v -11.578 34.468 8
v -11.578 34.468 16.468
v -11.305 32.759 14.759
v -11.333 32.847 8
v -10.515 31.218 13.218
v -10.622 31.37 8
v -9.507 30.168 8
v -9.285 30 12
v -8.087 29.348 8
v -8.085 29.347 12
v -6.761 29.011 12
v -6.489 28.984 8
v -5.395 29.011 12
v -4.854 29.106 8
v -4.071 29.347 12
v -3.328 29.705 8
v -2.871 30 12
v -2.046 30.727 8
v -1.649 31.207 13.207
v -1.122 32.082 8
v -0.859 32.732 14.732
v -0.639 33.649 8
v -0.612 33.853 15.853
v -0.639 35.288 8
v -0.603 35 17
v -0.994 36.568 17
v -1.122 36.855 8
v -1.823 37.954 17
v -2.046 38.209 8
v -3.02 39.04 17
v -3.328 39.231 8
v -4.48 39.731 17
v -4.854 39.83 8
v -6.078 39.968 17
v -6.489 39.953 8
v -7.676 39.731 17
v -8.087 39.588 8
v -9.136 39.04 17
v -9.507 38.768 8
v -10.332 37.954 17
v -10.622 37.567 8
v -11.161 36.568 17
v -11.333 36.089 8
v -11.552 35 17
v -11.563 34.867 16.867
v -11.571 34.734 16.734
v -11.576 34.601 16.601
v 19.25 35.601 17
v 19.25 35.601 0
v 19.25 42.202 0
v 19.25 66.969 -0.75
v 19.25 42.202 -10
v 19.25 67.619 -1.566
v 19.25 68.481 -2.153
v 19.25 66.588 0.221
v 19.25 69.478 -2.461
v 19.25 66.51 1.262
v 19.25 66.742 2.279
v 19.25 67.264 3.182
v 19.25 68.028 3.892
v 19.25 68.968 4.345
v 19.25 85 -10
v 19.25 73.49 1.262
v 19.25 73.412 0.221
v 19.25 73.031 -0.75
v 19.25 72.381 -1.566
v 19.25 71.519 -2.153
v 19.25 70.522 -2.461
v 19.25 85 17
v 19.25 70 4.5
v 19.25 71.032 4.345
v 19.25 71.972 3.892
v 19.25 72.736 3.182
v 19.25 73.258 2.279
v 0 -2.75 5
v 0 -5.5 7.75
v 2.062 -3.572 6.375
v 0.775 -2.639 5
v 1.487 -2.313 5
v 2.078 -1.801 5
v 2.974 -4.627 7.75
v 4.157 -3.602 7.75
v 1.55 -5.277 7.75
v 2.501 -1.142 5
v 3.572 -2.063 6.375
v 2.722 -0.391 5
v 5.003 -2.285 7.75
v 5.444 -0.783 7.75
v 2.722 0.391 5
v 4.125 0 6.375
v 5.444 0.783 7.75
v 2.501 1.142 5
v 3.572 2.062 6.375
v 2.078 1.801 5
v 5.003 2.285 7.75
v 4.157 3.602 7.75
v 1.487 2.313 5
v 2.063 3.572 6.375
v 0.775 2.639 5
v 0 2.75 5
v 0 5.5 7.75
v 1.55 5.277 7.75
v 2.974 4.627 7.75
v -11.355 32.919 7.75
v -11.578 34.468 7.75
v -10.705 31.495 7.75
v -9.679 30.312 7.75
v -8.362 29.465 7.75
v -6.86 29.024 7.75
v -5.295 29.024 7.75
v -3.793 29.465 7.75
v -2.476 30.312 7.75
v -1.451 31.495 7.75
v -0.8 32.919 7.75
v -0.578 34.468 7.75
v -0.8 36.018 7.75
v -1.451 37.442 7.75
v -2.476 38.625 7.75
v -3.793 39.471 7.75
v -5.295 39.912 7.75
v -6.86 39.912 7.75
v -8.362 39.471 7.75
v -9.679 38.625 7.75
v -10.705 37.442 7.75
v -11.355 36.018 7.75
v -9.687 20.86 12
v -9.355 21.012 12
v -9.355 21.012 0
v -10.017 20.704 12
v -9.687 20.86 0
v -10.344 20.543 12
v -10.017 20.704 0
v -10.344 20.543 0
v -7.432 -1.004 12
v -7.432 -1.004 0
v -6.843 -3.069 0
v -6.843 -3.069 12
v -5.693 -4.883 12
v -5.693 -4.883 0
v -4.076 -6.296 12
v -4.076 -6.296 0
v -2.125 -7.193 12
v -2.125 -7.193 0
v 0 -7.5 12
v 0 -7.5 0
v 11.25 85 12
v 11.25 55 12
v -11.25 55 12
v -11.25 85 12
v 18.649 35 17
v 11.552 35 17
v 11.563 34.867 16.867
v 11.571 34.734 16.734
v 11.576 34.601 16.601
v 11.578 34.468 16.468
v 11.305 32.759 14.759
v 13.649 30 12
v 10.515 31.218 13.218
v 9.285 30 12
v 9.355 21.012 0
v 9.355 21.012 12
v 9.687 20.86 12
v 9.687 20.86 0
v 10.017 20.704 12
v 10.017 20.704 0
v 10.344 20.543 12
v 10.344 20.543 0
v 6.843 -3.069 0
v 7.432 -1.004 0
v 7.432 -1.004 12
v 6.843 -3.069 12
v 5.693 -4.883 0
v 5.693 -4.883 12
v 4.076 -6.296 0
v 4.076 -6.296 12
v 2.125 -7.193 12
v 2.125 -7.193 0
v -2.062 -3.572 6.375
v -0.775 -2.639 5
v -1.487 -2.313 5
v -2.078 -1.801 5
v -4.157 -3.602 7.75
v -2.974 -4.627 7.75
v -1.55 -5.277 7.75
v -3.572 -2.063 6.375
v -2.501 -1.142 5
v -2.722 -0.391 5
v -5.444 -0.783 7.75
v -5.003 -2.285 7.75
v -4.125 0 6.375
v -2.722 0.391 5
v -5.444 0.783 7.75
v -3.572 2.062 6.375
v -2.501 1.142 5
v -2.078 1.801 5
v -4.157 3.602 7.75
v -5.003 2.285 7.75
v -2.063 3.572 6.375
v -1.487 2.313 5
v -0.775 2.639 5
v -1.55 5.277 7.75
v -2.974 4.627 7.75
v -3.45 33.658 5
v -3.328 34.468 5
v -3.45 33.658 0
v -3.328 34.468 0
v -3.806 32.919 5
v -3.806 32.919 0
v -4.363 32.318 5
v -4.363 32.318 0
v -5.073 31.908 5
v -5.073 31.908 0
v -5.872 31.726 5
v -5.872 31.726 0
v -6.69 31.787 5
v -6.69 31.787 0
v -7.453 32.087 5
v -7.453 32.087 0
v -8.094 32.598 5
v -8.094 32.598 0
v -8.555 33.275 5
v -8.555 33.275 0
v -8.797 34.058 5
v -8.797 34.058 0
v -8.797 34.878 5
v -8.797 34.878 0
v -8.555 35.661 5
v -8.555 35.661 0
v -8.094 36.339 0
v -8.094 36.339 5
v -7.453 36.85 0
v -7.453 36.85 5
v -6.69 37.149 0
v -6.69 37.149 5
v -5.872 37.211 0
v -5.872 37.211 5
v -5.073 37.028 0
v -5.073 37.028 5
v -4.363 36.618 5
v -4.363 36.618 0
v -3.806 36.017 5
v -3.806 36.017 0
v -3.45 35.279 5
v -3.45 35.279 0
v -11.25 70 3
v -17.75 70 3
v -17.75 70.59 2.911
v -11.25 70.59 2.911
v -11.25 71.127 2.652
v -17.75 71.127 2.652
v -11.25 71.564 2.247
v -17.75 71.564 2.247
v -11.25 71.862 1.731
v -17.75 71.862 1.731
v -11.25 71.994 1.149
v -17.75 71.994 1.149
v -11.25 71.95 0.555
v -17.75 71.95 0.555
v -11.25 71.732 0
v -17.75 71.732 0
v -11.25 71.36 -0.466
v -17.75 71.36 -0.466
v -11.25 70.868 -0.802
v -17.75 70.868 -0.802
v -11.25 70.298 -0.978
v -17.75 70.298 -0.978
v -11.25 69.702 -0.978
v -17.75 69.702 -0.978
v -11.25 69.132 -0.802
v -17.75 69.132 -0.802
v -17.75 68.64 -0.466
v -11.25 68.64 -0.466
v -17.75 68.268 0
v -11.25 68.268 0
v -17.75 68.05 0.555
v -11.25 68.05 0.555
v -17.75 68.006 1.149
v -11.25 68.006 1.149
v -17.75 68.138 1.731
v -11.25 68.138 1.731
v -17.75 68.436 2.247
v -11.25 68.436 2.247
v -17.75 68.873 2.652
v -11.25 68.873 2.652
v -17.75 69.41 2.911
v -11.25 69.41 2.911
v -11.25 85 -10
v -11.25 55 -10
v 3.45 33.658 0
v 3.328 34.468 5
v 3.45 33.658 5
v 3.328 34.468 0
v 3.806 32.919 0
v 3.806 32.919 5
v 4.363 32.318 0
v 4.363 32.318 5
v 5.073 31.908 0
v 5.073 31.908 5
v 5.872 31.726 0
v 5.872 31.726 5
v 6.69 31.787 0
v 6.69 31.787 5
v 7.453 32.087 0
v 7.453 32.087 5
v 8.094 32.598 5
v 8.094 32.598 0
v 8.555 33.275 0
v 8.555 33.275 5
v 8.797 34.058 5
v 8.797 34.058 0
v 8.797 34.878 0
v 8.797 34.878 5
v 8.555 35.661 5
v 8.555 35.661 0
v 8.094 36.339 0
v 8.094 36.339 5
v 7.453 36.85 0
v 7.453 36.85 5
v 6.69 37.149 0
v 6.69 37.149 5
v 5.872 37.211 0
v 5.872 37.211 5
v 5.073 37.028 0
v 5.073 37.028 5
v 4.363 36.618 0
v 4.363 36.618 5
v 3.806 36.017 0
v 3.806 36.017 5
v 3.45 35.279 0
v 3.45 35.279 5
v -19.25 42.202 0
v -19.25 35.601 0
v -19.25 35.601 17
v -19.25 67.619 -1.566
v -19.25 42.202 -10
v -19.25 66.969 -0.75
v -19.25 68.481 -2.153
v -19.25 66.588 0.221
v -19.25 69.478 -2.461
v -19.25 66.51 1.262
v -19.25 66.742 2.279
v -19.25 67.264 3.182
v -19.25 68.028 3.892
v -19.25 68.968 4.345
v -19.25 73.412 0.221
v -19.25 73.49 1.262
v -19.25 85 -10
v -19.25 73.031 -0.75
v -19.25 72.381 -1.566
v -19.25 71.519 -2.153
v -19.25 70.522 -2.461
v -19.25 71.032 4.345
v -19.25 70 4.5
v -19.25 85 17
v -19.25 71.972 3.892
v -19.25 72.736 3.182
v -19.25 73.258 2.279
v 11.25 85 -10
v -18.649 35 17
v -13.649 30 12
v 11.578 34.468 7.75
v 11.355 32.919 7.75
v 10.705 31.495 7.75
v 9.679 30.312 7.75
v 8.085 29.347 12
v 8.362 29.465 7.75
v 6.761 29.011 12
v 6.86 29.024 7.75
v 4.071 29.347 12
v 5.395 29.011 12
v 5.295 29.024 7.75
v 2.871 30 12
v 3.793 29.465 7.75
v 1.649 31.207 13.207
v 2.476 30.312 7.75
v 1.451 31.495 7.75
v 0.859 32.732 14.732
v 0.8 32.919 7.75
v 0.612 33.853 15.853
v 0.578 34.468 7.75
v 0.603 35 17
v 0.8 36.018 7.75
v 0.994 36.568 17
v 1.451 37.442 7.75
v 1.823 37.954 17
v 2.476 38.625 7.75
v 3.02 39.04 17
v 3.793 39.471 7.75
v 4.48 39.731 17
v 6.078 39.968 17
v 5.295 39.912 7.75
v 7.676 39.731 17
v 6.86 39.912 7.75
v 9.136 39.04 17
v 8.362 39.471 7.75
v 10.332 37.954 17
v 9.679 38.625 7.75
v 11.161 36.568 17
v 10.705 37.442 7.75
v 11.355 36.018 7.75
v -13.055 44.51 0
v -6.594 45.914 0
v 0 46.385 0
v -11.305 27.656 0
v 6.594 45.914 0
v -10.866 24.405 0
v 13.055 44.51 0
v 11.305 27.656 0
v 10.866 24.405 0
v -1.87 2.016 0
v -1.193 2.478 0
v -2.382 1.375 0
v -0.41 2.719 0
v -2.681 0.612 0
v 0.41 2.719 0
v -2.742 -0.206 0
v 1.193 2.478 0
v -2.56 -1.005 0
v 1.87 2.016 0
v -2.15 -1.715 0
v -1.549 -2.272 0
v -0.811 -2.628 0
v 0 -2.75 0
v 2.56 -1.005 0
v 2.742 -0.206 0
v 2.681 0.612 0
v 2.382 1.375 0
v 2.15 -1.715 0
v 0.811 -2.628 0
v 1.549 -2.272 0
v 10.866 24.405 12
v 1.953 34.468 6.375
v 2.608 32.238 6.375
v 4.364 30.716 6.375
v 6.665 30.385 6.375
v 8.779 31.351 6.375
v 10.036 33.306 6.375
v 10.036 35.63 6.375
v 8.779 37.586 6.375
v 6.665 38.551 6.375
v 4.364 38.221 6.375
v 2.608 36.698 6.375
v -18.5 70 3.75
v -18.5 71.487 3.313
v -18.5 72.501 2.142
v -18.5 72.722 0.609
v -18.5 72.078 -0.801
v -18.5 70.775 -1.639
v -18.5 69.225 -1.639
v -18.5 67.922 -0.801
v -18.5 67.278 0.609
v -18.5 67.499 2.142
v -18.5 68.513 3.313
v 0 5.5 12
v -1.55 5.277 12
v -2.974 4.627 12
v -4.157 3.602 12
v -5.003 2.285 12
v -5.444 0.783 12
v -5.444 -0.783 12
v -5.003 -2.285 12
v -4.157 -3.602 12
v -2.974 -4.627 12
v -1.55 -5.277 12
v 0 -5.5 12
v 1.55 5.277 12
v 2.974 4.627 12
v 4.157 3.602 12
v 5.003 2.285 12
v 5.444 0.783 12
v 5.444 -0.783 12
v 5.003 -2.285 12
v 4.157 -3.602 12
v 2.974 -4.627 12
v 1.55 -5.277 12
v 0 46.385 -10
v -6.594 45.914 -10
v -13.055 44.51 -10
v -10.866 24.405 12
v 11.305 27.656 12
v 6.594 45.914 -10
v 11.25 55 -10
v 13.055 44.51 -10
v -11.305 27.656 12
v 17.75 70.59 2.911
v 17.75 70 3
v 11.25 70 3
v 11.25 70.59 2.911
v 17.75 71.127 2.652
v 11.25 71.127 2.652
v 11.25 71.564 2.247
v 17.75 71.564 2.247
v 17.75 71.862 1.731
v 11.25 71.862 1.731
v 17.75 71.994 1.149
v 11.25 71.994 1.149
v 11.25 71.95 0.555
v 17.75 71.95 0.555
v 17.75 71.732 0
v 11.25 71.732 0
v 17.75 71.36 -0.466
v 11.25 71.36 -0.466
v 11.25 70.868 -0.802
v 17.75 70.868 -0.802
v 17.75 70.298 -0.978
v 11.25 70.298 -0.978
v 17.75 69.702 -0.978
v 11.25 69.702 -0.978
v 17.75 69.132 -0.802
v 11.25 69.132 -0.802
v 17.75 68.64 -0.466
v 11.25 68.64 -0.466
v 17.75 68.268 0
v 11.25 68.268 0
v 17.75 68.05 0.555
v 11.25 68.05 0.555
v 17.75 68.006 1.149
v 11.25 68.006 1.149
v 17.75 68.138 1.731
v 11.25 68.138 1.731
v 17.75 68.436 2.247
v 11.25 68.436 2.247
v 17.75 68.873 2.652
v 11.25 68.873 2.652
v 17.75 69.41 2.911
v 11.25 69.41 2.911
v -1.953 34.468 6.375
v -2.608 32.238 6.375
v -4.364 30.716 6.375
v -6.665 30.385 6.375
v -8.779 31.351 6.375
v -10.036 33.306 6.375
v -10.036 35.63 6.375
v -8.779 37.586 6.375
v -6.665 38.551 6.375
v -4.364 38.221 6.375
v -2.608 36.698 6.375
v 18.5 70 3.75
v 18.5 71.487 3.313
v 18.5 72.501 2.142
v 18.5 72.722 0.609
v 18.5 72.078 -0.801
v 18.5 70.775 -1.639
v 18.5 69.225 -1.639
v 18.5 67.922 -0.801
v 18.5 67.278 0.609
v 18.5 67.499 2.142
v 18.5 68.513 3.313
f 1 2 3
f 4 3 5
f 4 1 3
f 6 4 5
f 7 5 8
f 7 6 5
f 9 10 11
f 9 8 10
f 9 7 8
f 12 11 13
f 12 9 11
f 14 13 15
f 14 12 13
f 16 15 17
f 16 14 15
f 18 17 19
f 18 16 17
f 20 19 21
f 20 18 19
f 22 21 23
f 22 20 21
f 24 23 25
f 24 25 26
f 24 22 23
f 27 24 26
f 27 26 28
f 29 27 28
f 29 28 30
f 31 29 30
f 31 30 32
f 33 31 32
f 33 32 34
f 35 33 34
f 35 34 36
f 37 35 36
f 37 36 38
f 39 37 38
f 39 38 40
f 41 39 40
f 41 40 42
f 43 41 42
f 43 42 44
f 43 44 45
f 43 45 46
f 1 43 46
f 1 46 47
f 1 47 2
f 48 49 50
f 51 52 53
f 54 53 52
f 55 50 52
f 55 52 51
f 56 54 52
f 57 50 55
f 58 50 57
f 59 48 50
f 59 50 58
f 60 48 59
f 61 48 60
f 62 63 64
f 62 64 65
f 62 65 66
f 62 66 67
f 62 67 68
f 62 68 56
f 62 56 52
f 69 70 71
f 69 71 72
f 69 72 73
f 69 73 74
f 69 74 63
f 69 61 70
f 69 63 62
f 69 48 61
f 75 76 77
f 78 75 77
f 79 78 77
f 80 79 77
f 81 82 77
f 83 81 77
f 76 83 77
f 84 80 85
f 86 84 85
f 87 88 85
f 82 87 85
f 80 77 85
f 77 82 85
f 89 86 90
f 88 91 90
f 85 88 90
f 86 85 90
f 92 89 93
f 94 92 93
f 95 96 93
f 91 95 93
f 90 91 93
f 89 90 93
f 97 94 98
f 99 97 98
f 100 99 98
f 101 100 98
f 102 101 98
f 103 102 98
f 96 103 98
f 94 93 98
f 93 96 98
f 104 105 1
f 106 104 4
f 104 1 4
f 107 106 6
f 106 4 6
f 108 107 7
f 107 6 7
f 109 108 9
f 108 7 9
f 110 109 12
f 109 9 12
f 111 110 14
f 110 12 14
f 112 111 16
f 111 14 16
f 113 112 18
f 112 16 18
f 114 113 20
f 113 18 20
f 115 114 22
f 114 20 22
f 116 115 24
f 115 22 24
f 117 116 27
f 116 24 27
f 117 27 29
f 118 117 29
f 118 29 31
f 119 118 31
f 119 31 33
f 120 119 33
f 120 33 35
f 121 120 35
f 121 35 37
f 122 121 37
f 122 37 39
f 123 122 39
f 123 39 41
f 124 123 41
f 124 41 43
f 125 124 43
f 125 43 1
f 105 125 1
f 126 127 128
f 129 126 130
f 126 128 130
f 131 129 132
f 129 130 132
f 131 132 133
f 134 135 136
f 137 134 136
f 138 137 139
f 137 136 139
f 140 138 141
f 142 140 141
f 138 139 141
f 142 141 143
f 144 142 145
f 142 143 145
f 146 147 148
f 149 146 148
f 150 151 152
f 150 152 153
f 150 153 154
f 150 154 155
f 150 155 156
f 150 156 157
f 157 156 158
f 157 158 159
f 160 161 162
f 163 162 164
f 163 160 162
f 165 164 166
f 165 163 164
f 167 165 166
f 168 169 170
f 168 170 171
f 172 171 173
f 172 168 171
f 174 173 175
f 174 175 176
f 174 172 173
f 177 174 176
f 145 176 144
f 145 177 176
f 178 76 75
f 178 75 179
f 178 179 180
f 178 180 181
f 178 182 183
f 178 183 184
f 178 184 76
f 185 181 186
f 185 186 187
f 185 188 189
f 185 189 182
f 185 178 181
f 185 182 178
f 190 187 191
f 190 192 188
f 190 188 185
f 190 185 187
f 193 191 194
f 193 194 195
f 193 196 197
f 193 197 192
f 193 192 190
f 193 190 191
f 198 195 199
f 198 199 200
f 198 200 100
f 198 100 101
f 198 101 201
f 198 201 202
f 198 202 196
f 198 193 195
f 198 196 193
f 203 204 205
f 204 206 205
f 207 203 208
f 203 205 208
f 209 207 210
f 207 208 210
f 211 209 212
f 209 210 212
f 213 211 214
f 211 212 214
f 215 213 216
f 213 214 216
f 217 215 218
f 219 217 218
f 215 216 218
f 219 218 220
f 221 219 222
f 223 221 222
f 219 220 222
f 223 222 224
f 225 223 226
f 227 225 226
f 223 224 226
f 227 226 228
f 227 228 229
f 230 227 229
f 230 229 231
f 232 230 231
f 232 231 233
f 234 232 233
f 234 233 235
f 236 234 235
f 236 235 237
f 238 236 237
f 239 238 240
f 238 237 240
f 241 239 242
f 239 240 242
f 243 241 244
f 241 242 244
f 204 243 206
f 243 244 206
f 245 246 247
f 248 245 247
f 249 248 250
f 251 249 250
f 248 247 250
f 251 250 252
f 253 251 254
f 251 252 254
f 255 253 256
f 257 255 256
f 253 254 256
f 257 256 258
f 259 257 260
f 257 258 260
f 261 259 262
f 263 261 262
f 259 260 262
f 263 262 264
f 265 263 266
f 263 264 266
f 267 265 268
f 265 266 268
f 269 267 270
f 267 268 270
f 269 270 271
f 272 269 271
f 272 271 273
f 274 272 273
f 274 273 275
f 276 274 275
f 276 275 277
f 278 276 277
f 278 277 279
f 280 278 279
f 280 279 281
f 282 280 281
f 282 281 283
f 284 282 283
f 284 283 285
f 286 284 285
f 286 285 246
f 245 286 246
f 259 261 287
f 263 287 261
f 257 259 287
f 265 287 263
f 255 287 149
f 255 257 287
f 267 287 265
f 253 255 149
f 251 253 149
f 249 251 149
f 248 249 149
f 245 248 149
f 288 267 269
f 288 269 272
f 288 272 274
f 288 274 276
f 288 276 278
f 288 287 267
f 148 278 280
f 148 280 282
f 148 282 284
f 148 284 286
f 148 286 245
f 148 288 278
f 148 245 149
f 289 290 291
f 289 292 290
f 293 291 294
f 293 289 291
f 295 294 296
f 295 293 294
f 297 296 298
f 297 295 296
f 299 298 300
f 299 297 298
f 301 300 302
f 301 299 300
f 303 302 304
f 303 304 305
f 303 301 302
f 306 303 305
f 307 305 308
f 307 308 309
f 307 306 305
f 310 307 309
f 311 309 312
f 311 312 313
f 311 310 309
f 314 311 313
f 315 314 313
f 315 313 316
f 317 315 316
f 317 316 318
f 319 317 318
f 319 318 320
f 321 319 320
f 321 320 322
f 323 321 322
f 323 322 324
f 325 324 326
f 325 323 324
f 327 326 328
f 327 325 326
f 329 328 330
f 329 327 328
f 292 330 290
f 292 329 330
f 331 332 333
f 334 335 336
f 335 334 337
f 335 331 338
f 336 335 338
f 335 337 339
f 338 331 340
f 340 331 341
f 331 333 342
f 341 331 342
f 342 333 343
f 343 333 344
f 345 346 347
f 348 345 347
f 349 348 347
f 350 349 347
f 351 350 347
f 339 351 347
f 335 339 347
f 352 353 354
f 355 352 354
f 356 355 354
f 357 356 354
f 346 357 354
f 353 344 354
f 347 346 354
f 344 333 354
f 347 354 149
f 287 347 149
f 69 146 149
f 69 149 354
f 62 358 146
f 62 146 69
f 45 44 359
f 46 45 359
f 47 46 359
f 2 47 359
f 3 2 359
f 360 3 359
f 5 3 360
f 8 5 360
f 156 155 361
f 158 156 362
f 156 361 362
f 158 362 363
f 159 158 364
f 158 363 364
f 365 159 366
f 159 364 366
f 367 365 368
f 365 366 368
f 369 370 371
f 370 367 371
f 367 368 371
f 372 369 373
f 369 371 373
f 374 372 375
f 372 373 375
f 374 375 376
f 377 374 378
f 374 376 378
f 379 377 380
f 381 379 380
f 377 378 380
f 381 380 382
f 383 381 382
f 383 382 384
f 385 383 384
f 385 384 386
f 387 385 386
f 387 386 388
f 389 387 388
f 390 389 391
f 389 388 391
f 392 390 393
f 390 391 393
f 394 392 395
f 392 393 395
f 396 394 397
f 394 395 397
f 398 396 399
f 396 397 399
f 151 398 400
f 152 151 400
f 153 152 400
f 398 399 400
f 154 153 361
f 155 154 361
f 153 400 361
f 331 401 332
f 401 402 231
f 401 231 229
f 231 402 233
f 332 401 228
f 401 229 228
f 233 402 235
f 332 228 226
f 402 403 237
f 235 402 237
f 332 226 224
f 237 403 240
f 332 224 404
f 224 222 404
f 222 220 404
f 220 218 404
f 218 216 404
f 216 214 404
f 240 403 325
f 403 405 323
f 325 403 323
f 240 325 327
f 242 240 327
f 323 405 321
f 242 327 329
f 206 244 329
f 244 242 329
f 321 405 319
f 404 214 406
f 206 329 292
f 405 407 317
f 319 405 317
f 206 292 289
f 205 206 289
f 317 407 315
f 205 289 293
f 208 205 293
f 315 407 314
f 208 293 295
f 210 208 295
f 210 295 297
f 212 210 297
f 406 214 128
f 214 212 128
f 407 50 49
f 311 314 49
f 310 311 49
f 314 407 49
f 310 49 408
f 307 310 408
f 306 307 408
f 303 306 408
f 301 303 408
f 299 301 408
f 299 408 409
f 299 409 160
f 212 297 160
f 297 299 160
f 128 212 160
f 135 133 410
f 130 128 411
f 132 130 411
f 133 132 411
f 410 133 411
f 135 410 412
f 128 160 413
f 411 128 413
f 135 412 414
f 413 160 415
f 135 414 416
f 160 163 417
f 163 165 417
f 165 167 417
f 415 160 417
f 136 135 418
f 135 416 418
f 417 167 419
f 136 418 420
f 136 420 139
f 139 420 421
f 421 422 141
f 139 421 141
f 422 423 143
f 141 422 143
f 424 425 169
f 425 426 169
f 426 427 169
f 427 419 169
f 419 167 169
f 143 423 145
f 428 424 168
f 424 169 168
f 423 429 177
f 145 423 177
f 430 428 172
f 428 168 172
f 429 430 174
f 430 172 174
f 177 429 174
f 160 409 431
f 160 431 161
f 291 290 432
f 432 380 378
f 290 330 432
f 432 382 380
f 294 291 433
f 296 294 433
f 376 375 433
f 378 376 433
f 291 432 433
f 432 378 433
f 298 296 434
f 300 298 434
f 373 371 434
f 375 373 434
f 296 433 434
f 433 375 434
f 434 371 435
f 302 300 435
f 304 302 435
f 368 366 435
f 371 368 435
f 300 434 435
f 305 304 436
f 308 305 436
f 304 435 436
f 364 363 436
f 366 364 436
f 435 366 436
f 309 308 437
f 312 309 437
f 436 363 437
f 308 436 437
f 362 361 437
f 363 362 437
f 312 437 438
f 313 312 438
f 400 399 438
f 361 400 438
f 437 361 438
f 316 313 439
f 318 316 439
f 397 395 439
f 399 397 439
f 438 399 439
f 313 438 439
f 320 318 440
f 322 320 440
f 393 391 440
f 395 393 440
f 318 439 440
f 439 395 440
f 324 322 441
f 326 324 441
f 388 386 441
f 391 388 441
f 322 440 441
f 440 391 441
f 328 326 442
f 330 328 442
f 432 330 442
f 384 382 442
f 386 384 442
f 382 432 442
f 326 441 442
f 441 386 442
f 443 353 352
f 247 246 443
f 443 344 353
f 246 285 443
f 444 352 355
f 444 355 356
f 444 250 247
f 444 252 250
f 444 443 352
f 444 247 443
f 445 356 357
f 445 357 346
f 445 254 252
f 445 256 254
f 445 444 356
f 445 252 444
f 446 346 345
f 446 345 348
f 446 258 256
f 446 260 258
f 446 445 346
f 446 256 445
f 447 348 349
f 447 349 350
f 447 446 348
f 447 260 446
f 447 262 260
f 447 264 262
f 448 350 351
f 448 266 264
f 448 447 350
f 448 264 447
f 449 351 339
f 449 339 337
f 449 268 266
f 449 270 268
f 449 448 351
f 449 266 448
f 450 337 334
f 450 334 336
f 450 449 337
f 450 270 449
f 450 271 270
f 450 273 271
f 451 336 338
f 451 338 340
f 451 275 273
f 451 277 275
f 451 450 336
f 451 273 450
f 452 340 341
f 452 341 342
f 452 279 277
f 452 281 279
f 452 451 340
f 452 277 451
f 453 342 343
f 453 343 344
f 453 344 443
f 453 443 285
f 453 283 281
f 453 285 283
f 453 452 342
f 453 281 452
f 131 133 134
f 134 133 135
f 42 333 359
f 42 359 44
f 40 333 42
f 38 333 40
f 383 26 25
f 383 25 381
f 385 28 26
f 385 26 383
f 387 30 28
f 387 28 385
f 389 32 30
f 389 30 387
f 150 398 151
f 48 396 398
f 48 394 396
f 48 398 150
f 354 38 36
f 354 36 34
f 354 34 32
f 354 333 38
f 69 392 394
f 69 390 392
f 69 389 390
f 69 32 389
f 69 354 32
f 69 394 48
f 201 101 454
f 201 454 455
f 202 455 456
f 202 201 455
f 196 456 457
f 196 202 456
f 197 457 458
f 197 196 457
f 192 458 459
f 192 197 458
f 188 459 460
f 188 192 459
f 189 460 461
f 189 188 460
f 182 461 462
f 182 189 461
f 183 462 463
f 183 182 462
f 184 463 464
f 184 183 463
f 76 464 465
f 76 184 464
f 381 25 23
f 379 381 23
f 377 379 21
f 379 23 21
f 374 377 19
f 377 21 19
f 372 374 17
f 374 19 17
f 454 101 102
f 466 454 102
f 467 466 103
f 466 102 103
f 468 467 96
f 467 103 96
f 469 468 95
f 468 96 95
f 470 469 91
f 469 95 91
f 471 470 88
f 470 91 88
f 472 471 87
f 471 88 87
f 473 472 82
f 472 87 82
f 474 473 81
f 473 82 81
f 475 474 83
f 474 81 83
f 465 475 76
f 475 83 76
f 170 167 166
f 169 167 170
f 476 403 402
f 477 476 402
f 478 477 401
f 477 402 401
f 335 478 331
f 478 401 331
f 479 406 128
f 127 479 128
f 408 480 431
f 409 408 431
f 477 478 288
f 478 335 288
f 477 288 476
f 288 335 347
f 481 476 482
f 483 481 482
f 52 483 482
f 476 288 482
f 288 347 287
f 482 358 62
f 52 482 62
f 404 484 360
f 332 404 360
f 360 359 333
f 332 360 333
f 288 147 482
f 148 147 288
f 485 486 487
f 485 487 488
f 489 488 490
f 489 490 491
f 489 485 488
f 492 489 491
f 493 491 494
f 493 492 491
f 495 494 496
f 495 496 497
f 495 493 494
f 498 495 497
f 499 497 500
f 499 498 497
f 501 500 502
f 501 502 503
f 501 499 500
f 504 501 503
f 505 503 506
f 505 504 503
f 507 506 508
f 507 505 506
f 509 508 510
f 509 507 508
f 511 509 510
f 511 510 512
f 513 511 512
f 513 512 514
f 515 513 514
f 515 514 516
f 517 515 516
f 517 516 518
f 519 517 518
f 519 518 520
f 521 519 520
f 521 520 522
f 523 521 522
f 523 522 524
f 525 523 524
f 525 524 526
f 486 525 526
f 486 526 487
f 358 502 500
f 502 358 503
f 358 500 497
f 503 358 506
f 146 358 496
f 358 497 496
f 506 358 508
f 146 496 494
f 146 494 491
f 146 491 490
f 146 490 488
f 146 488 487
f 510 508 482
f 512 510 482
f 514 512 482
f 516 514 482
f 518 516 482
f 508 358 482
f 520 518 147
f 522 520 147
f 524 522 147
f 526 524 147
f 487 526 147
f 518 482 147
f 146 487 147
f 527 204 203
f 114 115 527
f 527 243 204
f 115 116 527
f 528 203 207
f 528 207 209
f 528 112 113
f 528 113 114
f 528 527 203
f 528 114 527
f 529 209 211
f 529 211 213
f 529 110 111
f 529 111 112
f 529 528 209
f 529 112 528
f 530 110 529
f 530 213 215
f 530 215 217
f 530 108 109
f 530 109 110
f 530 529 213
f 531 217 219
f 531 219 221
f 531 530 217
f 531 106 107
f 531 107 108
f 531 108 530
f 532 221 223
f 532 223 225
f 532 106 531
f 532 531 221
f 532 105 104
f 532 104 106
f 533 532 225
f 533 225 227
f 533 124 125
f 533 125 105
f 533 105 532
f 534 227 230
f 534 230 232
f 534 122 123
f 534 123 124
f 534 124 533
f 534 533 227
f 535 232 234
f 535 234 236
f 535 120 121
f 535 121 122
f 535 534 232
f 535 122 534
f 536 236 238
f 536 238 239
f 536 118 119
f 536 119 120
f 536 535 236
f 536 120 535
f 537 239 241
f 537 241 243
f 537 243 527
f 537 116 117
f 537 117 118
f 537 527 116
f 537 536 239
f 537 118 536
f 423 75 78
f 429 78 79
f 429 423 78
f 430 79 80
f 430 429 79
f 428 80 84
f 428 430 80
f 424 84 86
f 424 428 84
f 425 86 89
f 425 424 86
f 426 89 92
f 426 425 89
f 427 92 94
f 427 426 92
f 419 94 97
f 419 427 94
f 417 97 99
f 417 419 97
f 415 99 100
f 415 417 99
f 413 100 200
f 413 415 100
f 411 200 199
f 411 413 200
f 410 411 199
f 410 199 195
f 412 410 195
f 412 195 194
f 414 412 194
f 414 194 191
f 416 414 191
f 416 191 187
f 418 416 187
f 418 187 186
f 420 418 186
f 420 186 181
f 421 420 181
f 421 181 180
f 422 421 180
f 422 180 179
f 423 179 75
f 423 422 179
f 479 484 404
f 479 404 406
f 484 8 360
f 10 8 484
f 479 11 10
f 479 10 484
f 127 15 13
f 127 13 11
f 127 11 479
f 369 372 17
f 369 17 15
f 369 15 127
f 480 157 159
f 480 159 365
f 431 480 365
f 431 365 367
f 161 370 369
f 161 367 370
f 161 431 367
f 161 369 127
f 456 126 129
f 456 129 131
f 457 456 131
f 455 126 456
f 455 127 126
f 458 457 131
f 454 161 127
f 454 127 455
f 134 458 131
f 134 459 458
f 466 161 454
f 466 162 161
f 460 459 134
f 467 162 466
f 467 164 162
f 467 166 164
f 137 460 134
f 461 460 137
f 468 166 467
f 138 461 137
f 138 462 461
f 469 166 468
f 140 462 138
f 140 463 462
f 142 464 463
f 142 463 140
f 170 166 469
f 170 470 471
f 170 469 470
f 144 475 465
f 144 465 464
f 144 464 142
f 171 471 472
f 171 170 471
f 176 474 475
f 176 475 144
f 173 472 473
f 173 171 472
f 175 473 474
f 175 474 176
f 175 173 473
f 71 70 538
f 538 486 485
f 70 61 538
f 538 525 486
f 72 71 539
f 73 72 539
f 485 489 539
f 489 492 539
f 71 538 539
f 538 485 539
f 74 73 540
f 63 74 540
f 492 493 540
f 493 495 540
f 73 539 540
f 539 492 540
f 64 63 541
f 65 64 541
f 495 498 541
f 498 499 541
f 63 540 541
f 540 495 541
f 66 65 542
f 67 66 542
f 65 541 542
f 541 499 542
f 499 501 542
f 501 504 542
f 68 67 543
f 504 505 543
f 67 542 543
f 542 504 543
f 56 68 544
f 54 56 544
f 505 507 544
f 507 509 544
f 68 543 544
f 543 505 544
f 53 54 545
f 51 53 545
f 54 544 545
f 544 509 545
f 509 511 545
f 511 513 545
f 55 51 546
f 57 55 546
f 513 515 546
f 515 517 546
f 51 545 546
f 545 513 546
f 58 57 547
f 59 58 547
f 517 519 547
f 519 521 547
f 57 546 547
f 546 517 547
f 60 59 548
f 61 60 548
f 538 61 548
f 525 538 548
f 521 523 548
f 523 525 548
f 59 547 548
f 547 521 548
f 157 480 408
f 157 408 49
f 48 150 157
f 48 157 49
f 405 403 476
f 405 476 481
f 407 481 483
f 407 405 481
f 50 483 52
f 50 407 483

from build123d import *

# Parameters (mm, degrees)
SKETCH1_R                = 2.75
BOSS_EXTRUDE1_DEPTH      = 12
BOSS_EXTRUDE2_DEPTH      = 30
BOSS_EXTRUDE2_DEPTH_BACK = 10
CHAMFER1_SIZE            = 17.501152045
CHAMFER1_SIZE_2          = 15
SKETCH4_R                = 2
CUT_EXTRUDE1_DEPTH       = 30
CHAMFER2_SIZE            = 1.5
CUT_EXTRUDE2_DEPTH       = 30
CUT_EXTRUDE2_DEPTH_BACK  = 4
SKETCH5_R                = 5.5
CHAMFER3_SIZE            = 3
BOSS_EXTRUDE3_DEPTH      = 10


with BuildPart() as part:
    # Sketch1 → Boss-Extrude1 (new body)
    with BuildSketch(Plane.XY):
        with BuildLine():
            Line((0, 55), (-15, 55))
            Line((-15, 55), (-10.865898, 24.40520649))
            Line((-10.865898, 24.40520649), (-9.354942791, 21.011545526))
            ThreePointArc((-9.354942791, 21.011545526), (-9.852249787, 20.783002048), (-10.343977944, 20.542690191))
            Line((-10.343977944, 20.542690191), (-7.432453853, -1.004305596))
            ThreePointArc((-7.432453853, -1.004305596), (-4.935468976, -5.647224627), (0, -7.5))
            Line((0, -7.5), (0, -2.75))
            ThreePointArc((0, -2.75), (-2.75, 0), (0, 2.75))
            Line((0, 2.75), (0, 55))
        make_face()
        with Locations((-6.077686218, 34.468271355)):
            Circle(SKETCH1_R, mode=Mode.SUBTRACT)
    extrude(amount=BOSS_EXTRUDE1_DEPTH)

    # Sketch3 → Boss-Extrude2 (add, two sides: drawn at the far end of the back side and taken through both)
    with BuildSketch(Plane(origin=(0, 55, 0), x_dir=(1, 0, 0), z_dir=(0, 1, 0)).offset(-BOSS_EXTRUDE2_DEPTH_BACK)):
        Polygon((0, -17), (-19.25, -17), (-19.25, 10), (-11.25, 10), (-11.25, -12), (0, -12), align=None)
    extrude(amount=BOSS_EXTRUDE2_DEPTH + BOSS_EXTRUDE2_DEPTH_BACK)

    # Chamfer1
    # the kernel refuses this chamfer: 17.501152045, 15 mm, written as the material it adds along each edge
    with BuildSketch(Plane(origin=(-13.648756365, 45, 12), x_dir=(0.1571469904838525, -0.9875752241636421, 0), z_dir=(0, 0, -1))) as chamfer1_piece_1_section:
        Polygon((CHAMFER1_SIZE * 0.999724117502, CHAMFER1_SIZE * 0.0234880574124), (-CHAMFER1_SIZE_2 * 0.157146990484, CHAMFER1_SIZE_2 * 0.987575224164), (0, 0), align=None)
    chamfer1_piece_1 = extrude(amount=12, mode=Mode.PRIVATE)
    chamfer1_piece_1 = split(chamfer1_piece_1, bisect_by=Plane(origin=(-19.25, 37.743808278, 6), z_dir=(1, 0, 0)), keep=Keep.TOP, mode=Mode.PRIVATE)
    add(chamfer1_piece_1)
    # the kernel refuses this chamfer: 17.501152045, 15 mm, written as the material it adds along each edge
    with BuildSketch(Plane(origin=(0, 45, 12), x_dir=(0, 0.02749587661058632, 0.9996219169112968), z_dir=(-1, 0, 0))) as chamfer1_2_piece_1_section:
        Polygon((CHAMFER1_SIZE_2 * 0.999621916911, -CHAMFER1_SIZE_2 * 0.0274958766106), (-CHAMFER1_SIZE_2 * 0.0274958766106, -CHAMFER1_SIZE_2 * 0.999621916911), (0, 0), align=None)
    chamfer1_2_piece_1 = extrude(amount=19.25, mode=Mode.PRIVATE)
    chamfer1_2_piece_1 = chamfer1_2_piece_1 - Plane(origin=(-6.077686218, 34.468271355, 14.181154437), x_dir=(1, 0, 0), z_dir=(0, 0, -1)) * Cylinder(2.75, 99, mode=Mode.PRIVATE)
    chamfer1_2_piece_1 = split(chamfer1_2_piece_1, bisect_by=Plane(origin=(-16.223862411, 32.575106046, 14.181154437), z_dir=(0.7071067811865486, 0.7071067811865466, 0)), keep=Keep.TOP, mode=Mode.PRIVATE)
    chamfer1_2_piece_1 = split(chamfer1_2_piece_1, bisect_by=Plane(origin=(-9.68028065, 39.118687807, 17), z_dir=(0, 0, -1)), keep=Keep.TOP, mode=Mode.PRIVATE)
    add(chamfer1_2_piece_1)

    # Sketch4 → Cut-Extrude1 (cut)
    with BuildSketch(Plane.ZY.offset(19.25)):
        with Locations((1, 70)):
            Circle(SKETCH4_R)
    extrude(amount=-CUT_EXTRUDE1_DEPTH, mode=Mode.SUBTRACT)

    # Chamfer2
    chamfer2_edges = [part.edges().sort_by_distance(p)[0] for p in [
        (-19.25, 70, -1),
    ]]
    chamfer(chamfer2_edges, length=CHAMFER2_SIZE)

    # Sketch5 → Cut-Extrude2 (cut, two sides: drawn at the far end of the back side and taken through both)
    with BuildSketch(Plane.XY.offset(12).offset(-CUT_EXTRUDE2_DEPTH_BACK)):
        Circle(SKETCH5_R)
        with Locations(Location((-6.077686218, 34.468271355, 0), (0, 0, 180))):
            Circle(SKETCH5_R)
    extrude(amount=CUT_EXTRUDE2_DEPTH + CUT_EXTRUDE2_DEPTH_BACK, mode=Mode.SUBTRACT)

    # Chamfer3
    # the kernel refuses this chamfer: 3 mm, written as the material it takes off along each edge
    with BuildSketch(Plane(origin=(0, 0, 8), x_dir=(0.9999950652018582, -0.003141587485879657, 0), z_dir=(0.003141587485879657, 0.9999950652018582, 0))) as chamfer3_piece_1_section:
        Polygon((2.75, CHAMFER3_SIZE), (2.75 + CHAMFER3_SIZE, 0), (2.75, 0), align=None)
    chamfer3_piece_1 = revolve(axis=Axis((0, 0, 8), (0, 0, -1)), revolution_arc=359.64, mode=Mode.PRIVATE)
    chamfer3_piece_1 = chamfer3_piece_1 & Plane(origin=(0, 0, 6.366829543), x_dir=(1, 0, 0), z_dir=(0, 0, 1)) * Cylinder(5.5, 24, mode=Mode.PRIVATE)
    add(chamfer3_piece_1, mode=Mode.SUBTRACT)
    with BuildSketch(Plane(origin=(-6.077686218, 34.468271355, 8), x_dir=(1, 0, 0), z_dir=(0, 1, 0))) as chamfer3_piece_2_section:
        Polygon((2.75, CHAMFER3_SIZE), (2.75 + CHAMFER3_SIZE, 0), (2.75, 0), align=None)
    chamfer3_piece_2 = revolve(axis=Axis((-6.077686218, 34.468271355, 8), (0, 0, -1)), mode=Mode.PRIVATE)
    chamfer3_piece_2 = chamfer3_piece_2 & Plane(origin=(-6.077686218, 34.468271355, 6.366840969), x_dir=(-1, 0, 0), z_dir=(0, 0, 1)) * Cylinder(5.5, 23, mode=Mode.PRIVATE)
    add(chamfer3_piece_2, mode=Mode.SUBTRACT)

    # Sketch6 → Boss-Extrude3 (add)
    with BuildSketch(Plane(origin=(0, 0, 0), x_dir=(-1, 0, 0), z_dir=(0, 0, -1))):
        with BuildLine():
            Line((19.25, 42.201895692), (19.25, 55))
            Line((19.25, 55), (0, 55))
            Line((0, 55), (0, 46.384938288))
            ThreePointArc((0, 46.384938288), (9.849623665, 45.327115656), (19.25, 42.201895692))
        make_face()
    extrude(amount=BOSS_EXTRUDE3_DEPTH)

    # Mirror1: part across plane


with BuildPart() as part_1:
    add(part.part)
    add(part.part.mirror(Plane(origin=(0, 0, 12), x_dir=(0, 0, 1), z_dir=(-1, 0, 0))))


solid = part_1.part
